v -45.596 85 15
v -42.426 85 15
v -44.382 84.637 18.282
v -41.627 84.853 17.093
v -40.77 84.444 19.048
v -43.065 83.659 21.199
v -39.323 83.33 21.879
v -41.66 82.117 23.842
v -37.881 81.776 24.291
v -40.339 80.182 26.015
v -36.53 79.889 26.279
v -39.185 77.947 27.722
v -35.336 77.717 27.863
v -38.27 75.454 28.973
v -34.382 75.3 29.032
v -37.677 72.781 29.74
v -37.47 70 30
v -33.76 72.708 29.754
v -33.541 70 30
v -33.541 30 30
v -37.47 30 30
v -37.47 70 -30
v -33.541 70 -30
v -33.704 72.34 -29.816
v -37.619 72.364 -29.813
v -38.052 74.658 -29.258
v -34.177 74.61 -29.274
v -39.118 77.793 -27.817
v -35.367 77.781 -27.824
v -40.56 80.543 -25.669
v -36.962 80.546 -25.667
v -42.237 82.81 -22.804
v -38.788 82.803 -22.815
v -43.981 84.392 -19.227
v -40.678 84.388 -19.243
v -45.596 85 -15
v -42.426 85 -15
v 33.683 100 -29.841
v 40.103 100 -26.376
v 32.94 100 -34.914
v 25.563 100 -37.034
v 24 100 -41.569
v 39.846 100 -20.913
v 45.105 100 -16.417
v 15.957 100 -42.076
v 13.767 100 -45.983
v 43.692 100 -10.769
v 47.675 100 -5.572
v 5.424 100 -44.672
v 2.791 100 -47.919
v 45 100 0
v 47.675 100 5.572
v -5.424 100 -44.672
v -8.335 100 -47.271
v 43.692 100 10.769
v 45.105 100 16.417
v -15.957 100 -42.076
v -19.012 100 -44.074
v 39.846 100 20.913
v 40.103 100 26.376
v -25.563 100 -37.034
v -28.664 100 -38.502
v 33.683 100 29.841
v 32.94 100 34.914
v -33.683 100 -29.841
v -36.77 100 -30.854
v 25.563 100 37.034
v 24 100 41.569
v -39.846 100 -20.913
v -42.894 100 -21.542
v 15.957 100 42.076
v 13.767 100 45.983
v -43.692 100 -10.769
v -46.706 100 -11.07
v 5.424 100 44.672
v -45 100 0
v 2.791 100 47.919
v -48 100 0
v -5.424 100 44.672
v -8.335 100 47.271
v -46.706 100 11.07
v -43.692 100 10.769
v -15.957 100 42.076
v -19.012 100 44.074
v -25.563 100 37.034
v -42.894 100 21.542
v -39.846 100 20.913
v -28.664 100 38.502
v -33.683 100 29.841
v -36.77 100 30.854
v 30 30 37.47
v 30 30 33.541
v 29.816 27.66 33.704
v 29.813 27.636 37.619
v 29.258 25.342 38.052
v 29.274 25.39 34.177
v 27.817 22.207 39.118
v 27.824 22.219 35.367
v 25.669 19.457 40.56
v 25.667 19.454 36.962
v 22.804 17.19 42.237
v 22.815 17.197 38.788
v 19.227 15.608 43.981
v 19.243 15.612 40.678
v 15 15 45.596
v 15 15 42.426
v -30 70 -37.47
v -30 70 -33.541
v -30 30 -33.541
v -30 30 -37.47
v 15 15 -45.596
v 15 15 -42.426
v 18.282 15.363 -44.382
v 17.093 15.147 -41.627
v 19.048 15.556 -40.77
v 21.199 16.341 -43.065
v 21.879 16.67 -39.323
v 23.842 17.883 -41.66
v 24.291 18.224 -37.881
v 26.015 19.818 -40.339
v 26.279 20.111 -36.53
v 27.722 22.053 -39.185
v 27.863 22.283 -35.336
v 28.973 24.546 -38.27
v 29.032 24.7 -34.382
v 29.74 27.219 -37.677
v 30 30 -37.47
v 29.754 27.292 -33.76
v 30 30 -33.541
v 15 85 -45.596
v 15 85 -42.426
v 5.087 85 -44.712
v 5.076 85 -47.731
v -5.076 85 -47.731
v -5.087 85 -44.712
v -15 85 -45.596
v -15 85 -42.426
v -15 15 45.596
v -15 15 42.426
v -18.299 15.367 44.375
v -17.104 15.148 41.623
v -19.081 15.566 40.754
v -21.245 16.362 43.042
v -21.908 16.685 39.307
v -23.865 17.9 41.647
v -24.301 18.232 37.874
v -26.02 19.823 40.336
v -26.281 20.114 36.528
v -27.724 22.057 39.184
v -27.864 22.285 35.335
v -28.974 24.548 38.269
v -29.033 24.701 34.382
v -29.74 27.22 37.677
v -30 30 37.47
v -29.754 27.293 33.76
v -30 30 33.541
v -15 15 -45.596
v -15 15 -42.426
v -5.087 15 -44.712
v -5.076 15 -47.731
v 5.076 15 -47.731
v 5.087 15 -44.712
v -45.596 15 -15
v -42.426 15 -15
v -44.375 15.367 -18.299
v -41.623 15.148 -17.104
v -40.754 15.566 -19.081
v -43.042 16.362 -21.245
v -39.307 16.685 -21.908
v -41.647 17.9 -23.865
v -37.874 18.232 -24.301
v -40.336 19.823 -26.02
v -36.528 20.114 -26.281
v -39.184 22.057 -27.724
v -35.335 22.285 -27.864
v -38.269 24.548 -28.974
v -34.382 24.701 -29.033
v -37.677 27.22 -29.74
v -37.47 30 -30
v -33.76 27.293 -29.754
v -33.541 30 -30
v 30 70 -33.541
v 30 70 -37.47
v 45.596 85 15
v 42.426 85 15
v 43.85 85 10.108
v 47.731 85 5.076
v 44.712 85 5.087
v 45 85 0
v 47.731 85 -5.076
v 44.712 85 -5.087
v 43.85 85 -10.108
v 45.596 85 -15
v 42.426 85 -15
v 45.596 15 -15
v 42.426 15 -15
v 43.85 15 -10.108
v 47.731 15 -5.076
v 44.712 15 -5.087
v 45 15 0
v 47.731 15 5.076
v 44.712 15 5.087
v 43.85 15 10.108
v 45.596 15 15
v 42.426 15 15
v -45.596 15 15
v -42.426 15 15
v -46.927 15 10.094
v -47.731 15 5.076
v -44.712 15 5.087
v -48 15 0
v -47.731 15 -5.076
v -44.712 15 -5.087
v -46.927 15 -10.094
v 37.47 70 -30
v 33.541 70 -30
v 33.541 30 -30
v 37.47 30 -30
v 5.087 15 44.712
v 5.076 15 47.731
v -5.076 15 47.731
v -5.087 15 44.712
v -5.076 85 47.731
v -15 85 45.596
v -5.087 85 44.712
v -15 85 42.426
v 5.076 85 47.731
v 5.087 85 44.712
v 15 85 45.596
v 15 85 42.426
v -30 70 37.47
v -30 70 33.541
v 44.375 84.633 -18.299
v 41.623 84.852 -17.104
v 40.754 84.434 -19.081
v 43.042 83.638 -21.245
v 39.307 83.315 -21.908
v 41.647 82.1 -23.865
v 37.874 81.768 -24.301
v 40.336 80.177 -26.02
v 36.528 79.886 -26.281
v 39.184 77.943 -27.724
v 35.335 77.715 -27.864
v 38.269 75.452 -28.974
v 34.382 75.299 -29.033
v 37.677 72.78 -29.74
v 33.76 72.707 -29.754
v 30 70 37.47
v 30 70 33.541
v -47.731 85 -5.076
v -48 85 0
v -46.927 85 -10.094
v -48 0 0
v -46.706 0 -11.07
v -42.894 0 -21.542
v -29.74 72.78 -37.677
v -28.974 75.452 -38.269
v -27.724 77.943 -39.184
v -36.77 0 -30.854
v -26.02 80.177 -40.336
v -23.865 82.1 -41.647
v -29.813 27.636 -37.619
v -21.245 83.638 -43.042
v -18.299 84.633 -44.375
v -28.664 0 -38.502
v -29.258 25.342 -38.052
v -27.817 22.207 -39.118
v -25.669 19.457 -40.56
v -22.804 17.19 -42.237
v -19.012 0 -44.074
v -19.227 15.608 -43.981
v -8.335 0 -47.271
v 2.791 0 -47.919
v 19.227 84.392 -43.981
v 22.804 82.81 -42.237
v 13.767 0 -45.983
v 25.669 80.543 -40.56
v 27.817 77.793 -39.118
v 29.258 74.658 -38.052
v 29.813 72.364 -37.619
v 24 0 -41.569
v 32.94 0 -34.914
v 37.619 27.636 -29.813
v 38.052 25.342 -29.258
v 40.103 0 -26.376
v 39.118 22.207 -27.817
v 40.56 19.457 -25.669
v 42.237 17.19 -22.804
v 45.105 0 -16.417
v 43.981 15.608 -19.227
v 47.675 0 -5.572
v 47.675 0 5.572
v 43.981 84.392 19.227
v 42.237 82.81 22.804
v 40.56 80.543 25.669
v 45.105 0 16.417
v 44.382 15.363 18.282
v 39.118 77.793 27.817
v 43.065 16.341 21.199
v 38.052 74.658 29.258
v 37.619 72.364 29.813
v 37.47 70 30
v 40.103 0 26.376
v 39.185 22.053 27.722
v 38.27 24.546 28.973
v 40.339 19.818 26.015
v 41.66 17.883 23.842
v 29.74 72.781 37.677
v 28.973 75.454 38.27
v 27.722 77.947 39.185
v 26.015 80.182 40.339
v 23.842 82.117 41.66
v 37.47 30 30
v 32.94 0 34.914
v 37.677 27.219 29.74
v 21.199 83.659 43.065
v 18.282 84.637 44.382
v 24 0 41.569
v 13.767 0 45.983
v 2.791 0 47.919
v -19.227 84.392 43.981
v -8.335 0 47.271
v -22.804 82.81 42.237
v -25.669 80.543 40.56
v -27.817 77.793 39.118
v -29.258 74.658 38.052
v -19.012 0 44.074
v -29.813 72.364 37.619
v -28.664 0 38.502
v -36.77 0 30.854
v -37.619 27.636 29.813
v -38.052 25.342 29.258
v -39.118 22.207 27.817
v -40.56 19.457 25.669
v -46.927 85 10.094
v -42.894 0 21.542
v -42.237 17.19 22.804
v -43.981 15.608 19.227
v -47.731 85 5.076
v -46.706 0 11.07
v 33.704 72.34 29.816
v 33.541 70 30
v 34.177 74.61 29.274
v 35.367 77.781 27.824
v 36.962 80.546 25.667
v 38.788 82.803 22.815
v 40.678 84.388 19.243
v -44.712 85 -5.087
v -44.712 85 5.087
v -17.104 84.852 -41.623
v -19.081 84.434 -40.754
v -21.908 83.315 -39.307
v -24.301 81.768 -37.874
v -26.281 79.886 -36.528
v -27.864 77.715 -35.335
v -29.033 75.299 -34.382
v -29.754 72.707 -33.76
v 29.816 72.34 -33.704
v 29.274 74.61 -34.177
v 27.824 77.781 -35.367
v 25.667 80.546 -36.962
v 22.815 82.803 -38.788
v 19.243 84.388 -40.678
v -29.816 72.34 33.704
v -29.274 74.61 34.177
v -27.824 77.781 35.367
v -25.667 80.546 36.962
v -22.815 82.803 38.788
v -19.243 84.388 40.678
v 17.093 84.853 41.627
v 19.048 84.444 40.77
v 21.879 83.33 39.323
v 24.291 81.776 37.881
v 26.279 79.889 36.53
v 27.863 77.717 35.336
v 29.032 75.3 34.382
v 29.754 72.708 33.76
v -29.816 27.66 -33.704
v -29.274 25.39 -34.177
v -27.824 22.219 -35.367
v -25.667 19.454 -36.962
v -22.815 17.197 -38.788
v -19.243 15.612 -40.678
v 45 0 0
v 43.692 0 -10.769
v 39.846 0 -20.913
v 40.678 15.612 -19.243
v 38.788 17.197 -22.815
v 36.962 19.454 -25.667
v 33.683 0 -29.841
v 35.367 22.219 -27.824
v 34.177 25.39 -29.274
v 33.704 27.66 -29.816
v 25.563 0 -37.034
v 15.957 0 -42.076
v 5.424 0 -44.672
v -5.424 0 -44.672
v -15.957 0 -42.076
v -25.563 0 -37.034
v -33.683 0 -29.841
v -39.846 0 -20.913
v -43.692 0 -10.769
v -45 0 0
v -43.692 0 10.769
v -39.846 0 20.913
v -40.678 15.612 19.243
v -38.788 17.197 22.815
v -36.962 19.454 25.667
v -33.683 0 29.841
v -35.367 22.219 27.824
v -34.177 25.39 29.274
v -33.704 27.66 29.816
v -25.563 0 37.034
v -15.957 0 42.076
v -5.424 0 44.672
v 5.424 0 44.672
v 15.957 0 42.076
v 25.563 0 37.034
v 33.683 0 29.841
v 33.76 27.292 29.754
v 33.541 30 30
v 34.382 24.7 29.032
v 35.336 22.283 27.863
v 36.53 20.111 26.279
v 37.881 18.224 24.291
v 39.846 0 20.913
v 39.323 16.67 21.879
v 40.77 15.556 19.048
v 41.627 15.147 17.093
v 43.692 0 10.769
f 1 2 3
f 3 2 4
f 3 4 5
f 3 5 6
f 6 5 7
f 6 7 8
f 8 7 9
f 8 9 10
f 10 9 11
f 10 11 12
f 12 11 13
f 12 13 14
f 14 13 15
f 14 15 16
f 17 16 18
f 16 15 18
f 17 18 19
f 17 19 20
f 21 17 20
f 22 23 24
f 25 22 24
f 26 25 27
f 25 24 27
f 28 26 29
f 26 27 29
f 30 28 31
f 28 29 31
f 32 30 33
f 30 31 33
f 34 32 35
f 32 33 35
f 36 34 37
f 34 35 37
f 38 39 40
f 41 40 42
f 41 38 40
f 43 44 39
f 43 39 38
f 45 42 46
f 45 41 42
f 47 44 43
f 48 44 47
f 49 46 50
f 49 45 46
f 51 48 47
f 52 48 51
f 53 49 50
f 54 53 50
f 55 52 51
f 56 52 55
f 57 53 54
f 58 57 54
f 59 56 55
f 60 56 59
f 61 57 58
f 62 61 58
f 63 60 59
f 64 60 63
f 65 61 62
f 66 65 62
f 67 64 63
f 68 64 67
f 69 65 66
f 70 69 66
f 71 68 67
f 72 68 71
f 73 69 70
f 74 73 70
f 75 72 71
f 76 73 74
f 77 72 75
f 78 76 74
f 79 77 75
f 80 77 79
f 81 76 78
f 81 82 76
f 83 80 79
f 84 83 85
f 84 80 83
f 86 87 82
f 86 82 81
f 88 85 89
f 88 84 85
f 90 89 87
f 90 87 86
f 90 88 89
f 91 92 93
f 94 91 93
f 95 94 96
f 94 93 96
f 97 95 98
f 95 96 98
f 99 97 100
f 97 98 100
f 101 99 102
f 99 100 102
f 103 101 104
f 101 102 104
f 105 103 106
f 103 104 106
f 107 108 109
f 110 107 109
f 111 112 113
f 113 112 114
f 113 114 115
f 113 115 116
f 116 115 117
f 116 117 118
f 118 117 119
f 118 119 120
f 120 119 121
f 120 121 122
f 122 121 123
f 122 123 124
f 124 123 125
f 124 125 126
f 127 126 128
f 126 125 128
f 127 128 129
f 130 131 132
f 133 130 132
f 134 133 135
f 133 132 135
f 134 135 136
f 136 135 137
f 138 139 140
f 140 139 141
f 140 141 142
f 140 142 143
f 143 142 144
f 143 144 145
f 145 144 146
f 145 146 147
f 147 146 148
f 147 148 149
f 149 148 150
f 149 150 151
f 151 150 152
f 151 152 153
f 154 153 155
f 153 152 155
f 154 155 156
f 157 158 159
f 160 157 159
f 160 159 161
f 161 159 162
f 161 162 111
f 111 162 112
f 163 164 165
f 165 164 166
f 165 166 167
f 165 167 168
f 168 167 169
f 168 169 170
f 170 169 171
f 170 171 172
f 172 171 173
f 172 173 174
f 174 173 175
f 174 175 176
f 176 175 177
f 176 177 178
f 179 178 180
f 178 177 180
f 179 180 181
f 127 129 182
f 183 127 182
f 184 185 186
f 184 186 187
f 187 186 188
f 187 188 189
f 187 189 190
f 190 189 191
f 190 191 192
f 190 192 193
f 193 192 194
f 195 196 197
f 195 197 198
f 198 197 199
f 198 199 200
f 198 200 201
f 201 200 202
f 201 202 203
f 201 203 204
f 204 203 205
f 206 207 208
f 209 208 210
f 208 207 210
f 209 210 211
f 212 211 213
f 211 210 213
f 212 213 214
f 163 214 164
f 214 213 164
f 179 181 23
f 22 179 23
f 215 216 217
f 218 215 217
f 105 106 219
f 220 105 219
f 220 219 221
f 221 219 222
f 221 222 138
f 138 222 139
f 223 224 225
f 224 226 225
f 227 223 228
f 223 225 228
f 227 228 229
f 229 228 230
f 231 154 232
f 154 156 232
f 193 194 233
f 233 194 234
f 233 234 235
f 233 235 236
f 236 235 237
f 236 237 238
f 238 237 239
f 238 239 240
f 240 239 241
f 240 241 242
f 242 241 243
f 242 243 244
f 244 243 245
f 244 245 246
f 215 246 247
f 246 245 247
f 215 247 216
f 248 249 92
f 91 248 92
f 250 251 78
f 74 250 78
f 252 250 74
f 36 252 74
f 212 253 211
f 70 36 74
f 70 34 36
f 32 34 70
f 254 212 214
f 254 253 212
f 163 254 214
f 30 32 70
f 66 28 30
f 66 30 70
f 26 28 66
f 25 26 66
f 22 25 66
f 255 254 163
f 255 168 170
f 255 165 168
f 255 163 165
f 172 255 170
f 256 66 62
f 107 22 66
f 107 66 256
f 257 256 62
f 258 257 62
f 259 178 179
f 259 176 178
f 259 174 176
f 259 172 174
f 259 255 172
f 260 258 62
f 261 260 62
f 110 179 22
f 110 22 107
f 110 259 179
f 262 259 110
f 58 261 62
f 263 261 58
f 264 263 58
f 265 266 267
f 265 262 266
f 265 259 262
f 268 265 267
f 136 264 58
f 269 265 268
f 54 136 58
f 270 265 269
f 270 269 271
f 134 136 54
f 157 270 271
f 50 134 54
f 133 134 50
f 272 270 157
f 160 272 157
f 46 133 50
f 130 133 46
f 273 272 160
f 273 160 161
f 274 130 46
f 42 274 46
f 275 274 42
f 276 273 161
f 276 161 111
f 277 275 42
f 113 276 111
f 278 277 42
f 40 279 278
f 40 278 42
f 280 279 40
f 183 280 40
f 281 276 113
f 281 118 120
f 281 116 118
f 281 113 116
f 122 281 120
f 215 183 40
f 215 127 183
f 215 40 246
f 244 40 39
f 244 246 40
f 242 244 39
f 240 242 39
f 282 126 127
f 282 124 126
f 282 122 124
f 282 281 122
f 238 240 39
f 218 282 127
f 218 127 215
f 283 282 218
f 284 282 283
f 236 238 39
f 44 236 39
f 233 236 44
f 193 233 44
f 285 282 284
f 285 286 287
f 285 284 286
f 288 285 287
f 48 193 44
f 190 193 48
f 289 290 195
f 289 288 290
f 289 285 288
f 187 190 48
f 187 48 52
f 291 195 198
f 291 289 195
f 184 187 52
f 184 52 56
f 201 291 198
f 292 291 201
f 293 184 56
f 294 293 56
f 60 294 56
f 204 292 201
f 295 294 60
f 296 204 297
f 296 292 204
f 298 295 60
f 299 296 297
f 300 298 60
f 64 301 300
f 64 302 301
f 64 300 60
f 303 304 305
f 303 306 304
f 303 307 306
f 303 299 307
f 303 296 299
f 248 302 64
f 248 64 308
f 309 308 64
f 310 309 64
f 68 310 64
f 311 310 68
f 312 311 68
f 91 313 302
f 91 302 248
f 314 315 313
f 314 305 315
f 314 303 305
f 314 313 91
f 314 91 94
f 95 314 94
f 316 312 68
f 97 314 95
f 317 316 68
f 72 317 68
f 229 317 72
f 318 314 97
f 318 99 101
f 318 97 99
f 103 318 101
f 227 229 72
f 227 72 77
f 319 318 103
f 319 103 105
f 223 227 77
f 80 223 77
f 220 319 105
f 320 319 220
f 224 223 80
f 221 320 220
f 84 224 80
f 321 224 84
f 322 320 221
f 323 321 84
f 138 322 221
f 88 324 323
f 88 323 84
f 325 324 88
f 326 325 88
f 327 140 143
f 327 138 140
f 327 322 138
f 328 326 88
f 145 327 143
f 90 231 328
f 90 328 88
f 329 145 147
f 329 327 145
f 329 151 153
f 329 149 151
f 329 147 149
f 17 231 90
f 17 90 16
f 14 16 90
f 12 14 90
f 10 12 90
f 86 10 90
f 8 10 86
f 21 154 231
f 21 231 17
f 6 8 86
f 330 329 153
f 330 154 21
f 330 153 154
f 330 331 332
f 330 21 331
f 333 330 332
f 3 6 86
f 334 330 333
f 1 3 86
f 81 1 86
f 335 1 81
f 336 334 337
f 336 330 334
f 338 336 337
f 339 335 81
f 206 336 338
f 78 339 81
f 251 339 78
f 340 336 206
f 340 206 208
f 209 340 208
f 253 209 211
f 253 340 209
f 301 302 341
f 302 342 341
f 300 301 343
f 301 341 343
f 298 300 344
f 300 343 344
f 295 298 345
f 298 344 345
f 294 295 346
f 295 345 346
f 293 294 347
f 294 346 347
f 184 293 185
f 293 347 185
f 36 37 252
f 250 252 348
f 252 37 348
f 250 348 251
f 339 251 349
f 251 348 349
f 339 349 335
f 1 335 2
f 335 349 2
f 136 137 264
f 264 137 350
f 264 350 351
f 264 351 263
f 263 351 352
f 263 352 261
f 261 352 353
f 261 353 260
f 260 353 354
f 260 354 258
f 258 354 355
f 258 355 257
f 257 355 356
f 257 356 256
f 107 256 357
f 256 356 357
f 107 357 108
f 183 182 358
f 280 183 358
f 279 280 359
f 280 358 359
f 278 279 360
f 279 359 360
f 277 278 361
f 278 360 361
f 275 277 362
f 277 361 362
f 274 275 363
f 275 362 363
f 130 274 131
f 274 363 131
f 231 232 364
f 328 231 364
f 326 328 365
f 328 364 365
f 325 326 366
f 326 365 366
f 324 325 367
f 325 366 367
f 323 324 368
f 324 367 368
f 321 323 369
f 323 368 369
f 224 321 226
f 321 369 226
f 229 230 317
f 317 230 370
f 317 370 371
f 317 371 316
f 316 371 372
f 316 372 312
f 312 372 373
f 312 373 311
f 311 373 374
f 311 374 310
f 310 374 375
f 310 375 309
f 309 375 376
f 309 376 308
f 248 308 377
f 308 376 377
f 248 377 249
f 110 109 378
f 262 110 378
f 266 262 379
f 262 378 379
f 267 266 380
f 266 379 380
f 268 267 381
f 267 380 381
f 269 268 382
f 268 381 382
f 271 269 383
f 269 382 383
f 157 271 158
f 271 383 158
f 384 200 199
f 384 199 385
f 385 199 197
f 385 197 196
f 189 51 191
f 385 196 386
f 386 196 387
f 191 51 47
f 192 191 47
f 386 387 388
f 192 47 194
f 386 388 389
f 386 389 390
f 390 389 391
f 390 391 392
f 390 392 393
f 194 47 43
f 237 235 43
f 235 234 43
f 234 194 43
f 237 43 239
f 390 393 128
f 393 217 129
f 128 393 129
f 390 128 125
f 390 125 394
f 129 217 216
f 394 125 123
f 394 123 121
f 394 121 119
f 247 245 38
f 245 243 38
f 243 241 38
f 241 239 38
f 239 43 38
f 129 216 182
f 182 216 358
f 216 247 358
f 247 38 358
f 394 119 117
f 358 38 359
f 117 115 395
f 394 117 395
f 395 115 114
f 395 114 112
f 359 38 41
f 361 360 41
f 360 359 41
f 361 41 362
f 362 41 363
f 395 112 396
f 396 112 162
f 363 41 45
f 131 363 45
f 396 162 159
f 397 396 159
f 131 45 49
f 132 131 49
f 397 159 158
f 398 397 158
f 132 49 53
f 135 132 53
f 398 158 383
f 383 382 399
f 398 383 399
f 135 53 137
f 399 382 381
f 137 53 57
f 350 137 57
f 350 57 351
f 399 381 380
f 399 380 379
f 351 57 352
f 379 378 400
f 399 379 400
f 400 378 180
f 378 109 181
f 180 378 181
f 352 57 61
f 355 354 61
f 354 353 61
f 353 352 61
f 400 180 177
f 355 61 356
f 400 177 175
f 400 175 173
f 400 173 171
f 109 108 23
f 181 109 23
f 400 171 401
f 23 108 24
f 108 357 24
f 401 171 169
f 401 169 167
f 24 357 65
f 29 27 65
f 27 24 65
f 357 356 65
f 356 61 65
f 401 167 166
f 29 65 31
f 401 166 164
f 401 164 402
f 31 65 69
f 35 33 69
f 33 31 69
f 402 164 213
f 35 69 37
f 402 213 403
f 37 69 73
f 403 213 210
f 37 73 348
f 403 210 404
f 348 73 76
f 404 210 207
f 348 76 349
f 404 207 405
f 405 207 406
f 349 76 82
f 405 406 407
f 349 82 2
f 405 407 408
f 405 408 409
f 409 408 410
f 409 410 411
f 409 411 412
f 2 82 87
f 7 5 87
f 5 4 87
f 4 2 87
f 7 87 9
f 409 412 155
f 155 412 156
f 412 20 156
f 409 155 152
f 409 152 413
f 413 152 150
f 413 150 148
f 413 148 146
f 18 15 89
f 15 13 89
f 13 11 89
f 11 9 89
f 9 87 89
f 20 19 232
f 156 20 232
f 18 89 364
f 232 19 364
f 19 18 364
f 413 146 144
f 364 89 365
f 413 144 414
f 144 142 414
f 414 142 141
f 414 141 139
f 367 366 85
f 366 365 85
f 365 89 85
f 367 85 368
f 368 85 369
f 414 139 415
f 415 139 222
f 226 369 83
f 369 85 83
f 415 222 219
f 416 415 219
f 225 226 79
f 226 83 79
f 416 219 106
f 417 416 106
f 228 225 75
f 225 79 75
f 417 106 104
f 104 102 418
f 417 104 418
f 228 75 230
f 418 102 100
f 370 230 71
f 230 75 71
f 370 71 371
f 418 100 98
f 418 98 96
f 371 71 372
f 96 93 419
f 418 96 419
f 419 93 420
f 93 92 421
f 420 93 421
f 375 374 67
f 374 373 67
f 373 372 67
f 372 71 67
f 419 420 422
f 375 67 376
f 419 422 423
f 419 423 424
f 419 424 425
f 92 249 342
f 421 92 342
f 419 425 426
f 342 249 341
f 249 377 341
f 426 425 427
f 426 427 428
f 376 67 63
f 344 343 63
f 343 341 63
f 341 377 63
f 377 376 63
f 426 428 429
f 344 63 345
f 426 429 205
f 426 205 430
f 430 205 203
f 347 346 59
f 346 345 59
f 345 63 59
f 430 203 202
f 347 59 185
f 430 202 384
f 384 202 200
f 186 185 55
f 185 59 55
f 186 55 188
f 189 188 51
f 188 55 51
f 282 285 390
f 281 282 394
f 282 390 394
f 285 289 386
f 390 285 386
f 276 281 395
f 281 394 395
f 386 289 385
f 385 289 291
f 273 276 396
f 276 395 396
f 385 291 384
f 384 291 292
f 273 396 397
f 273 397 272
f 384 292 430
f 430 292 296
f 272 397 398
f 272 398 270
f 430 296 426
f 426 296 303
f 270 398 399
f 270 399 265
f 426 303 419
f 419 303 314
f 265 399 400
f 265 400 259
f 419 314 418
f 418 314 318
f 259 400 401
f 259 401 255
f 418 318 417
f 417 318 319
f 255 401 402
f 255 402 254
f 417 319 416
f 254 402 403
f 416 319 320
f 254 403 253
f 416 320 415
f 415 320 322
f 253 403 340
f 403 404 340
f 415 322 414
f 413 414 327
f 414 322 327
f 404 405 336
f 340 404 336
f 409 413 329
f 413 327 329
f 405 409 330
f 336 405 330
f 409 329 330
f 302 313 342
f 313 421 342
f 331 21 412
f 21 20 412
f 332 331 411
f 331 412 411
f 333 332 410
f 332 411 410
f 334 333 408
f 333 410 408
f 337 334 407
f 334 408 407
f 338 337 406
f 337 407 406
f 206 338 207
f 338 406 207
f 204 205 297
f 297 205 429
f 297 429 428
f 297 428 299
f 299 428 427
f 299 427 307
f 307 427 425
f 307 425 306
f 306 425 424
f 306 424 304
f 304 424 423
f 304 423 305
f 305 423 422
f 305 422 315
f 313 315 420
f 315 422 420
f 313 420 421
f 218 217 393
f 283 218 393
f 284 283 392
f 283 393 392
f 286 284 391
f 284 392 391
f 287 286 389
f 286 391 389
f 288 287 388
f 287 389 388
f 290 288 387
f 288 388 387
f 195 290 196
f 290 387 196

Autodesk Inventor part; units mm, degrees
ref_plane "YZ Plane" through (0, 0, 0) normal (1, 0, 0) x (0, 1, 0)
ref_plane "XZ Plane" through (0, 0, 0) normal (0, 1, 0) x (-1, 0, 0)
ref_plane "XY Plane" through (0, 0, 0) normal (0, 0, 1) x (1, 0, 0)
sketch "Sketch1" plane through (0, 0, 0) normal (0, 1, 0) x (-1, 0, 0)
  circle A0 centre (0, 0) radius 48
  dimension "d0" = 96
extrude "Extrusion1" add sketch "Sketch1" along normal blind 100
sketch "Sketch2" plane through (0, 100, 0) normal (0, 1, 0) x (1, 0, 0)
  circle A0 centre (0, 0) radius 45
  dimension "d3" = 90
extrude "Extrusion2" cut sketch "Sketch2" against normal blind 100
sketch "Sketch3" plane through (0, 0, 0) normal (0, 0, 1) x (1, 0, 0)
  line L0 (-15, 85) -> (15, 85)
  line L1 (30, 70) -> (30, 30)
  line L2 (15, 15) -> (-15, 15)
  line L3 (-30, 30) -> (-30, 70)
  line L4 (-30, 85) -> (30, 15) construction
  line L5 (30, 85) -> (-30, 15) construction
  arc A0 (30, 70) -> (15, 85) centre (15, 70) ccw
  arc A1 (-15, 85) -> (-30, 70) centre (-15, 70) ccw
  arc A2 (-30, 30) -> (-15, 15) centre (-15, 30) ccw
  arc A3 (15, 15) -> (30, 30) centre (15, 30) ccw
  point P0 (0, 0)
  point P1 (0, 50)
  dimension "d6" = 60
  dimension "d7" = 70
  dimension "d8" = 15
extrude "Extrusion3" cut sketch "Sketch3" along normal blind 100
pattern_circular "Circular Pattern1" count 4 over 360 about axis through (0, 100, 0) along (0, -1, 0) of "Extrusion3"
properties part number "Khay đựng cốc"
